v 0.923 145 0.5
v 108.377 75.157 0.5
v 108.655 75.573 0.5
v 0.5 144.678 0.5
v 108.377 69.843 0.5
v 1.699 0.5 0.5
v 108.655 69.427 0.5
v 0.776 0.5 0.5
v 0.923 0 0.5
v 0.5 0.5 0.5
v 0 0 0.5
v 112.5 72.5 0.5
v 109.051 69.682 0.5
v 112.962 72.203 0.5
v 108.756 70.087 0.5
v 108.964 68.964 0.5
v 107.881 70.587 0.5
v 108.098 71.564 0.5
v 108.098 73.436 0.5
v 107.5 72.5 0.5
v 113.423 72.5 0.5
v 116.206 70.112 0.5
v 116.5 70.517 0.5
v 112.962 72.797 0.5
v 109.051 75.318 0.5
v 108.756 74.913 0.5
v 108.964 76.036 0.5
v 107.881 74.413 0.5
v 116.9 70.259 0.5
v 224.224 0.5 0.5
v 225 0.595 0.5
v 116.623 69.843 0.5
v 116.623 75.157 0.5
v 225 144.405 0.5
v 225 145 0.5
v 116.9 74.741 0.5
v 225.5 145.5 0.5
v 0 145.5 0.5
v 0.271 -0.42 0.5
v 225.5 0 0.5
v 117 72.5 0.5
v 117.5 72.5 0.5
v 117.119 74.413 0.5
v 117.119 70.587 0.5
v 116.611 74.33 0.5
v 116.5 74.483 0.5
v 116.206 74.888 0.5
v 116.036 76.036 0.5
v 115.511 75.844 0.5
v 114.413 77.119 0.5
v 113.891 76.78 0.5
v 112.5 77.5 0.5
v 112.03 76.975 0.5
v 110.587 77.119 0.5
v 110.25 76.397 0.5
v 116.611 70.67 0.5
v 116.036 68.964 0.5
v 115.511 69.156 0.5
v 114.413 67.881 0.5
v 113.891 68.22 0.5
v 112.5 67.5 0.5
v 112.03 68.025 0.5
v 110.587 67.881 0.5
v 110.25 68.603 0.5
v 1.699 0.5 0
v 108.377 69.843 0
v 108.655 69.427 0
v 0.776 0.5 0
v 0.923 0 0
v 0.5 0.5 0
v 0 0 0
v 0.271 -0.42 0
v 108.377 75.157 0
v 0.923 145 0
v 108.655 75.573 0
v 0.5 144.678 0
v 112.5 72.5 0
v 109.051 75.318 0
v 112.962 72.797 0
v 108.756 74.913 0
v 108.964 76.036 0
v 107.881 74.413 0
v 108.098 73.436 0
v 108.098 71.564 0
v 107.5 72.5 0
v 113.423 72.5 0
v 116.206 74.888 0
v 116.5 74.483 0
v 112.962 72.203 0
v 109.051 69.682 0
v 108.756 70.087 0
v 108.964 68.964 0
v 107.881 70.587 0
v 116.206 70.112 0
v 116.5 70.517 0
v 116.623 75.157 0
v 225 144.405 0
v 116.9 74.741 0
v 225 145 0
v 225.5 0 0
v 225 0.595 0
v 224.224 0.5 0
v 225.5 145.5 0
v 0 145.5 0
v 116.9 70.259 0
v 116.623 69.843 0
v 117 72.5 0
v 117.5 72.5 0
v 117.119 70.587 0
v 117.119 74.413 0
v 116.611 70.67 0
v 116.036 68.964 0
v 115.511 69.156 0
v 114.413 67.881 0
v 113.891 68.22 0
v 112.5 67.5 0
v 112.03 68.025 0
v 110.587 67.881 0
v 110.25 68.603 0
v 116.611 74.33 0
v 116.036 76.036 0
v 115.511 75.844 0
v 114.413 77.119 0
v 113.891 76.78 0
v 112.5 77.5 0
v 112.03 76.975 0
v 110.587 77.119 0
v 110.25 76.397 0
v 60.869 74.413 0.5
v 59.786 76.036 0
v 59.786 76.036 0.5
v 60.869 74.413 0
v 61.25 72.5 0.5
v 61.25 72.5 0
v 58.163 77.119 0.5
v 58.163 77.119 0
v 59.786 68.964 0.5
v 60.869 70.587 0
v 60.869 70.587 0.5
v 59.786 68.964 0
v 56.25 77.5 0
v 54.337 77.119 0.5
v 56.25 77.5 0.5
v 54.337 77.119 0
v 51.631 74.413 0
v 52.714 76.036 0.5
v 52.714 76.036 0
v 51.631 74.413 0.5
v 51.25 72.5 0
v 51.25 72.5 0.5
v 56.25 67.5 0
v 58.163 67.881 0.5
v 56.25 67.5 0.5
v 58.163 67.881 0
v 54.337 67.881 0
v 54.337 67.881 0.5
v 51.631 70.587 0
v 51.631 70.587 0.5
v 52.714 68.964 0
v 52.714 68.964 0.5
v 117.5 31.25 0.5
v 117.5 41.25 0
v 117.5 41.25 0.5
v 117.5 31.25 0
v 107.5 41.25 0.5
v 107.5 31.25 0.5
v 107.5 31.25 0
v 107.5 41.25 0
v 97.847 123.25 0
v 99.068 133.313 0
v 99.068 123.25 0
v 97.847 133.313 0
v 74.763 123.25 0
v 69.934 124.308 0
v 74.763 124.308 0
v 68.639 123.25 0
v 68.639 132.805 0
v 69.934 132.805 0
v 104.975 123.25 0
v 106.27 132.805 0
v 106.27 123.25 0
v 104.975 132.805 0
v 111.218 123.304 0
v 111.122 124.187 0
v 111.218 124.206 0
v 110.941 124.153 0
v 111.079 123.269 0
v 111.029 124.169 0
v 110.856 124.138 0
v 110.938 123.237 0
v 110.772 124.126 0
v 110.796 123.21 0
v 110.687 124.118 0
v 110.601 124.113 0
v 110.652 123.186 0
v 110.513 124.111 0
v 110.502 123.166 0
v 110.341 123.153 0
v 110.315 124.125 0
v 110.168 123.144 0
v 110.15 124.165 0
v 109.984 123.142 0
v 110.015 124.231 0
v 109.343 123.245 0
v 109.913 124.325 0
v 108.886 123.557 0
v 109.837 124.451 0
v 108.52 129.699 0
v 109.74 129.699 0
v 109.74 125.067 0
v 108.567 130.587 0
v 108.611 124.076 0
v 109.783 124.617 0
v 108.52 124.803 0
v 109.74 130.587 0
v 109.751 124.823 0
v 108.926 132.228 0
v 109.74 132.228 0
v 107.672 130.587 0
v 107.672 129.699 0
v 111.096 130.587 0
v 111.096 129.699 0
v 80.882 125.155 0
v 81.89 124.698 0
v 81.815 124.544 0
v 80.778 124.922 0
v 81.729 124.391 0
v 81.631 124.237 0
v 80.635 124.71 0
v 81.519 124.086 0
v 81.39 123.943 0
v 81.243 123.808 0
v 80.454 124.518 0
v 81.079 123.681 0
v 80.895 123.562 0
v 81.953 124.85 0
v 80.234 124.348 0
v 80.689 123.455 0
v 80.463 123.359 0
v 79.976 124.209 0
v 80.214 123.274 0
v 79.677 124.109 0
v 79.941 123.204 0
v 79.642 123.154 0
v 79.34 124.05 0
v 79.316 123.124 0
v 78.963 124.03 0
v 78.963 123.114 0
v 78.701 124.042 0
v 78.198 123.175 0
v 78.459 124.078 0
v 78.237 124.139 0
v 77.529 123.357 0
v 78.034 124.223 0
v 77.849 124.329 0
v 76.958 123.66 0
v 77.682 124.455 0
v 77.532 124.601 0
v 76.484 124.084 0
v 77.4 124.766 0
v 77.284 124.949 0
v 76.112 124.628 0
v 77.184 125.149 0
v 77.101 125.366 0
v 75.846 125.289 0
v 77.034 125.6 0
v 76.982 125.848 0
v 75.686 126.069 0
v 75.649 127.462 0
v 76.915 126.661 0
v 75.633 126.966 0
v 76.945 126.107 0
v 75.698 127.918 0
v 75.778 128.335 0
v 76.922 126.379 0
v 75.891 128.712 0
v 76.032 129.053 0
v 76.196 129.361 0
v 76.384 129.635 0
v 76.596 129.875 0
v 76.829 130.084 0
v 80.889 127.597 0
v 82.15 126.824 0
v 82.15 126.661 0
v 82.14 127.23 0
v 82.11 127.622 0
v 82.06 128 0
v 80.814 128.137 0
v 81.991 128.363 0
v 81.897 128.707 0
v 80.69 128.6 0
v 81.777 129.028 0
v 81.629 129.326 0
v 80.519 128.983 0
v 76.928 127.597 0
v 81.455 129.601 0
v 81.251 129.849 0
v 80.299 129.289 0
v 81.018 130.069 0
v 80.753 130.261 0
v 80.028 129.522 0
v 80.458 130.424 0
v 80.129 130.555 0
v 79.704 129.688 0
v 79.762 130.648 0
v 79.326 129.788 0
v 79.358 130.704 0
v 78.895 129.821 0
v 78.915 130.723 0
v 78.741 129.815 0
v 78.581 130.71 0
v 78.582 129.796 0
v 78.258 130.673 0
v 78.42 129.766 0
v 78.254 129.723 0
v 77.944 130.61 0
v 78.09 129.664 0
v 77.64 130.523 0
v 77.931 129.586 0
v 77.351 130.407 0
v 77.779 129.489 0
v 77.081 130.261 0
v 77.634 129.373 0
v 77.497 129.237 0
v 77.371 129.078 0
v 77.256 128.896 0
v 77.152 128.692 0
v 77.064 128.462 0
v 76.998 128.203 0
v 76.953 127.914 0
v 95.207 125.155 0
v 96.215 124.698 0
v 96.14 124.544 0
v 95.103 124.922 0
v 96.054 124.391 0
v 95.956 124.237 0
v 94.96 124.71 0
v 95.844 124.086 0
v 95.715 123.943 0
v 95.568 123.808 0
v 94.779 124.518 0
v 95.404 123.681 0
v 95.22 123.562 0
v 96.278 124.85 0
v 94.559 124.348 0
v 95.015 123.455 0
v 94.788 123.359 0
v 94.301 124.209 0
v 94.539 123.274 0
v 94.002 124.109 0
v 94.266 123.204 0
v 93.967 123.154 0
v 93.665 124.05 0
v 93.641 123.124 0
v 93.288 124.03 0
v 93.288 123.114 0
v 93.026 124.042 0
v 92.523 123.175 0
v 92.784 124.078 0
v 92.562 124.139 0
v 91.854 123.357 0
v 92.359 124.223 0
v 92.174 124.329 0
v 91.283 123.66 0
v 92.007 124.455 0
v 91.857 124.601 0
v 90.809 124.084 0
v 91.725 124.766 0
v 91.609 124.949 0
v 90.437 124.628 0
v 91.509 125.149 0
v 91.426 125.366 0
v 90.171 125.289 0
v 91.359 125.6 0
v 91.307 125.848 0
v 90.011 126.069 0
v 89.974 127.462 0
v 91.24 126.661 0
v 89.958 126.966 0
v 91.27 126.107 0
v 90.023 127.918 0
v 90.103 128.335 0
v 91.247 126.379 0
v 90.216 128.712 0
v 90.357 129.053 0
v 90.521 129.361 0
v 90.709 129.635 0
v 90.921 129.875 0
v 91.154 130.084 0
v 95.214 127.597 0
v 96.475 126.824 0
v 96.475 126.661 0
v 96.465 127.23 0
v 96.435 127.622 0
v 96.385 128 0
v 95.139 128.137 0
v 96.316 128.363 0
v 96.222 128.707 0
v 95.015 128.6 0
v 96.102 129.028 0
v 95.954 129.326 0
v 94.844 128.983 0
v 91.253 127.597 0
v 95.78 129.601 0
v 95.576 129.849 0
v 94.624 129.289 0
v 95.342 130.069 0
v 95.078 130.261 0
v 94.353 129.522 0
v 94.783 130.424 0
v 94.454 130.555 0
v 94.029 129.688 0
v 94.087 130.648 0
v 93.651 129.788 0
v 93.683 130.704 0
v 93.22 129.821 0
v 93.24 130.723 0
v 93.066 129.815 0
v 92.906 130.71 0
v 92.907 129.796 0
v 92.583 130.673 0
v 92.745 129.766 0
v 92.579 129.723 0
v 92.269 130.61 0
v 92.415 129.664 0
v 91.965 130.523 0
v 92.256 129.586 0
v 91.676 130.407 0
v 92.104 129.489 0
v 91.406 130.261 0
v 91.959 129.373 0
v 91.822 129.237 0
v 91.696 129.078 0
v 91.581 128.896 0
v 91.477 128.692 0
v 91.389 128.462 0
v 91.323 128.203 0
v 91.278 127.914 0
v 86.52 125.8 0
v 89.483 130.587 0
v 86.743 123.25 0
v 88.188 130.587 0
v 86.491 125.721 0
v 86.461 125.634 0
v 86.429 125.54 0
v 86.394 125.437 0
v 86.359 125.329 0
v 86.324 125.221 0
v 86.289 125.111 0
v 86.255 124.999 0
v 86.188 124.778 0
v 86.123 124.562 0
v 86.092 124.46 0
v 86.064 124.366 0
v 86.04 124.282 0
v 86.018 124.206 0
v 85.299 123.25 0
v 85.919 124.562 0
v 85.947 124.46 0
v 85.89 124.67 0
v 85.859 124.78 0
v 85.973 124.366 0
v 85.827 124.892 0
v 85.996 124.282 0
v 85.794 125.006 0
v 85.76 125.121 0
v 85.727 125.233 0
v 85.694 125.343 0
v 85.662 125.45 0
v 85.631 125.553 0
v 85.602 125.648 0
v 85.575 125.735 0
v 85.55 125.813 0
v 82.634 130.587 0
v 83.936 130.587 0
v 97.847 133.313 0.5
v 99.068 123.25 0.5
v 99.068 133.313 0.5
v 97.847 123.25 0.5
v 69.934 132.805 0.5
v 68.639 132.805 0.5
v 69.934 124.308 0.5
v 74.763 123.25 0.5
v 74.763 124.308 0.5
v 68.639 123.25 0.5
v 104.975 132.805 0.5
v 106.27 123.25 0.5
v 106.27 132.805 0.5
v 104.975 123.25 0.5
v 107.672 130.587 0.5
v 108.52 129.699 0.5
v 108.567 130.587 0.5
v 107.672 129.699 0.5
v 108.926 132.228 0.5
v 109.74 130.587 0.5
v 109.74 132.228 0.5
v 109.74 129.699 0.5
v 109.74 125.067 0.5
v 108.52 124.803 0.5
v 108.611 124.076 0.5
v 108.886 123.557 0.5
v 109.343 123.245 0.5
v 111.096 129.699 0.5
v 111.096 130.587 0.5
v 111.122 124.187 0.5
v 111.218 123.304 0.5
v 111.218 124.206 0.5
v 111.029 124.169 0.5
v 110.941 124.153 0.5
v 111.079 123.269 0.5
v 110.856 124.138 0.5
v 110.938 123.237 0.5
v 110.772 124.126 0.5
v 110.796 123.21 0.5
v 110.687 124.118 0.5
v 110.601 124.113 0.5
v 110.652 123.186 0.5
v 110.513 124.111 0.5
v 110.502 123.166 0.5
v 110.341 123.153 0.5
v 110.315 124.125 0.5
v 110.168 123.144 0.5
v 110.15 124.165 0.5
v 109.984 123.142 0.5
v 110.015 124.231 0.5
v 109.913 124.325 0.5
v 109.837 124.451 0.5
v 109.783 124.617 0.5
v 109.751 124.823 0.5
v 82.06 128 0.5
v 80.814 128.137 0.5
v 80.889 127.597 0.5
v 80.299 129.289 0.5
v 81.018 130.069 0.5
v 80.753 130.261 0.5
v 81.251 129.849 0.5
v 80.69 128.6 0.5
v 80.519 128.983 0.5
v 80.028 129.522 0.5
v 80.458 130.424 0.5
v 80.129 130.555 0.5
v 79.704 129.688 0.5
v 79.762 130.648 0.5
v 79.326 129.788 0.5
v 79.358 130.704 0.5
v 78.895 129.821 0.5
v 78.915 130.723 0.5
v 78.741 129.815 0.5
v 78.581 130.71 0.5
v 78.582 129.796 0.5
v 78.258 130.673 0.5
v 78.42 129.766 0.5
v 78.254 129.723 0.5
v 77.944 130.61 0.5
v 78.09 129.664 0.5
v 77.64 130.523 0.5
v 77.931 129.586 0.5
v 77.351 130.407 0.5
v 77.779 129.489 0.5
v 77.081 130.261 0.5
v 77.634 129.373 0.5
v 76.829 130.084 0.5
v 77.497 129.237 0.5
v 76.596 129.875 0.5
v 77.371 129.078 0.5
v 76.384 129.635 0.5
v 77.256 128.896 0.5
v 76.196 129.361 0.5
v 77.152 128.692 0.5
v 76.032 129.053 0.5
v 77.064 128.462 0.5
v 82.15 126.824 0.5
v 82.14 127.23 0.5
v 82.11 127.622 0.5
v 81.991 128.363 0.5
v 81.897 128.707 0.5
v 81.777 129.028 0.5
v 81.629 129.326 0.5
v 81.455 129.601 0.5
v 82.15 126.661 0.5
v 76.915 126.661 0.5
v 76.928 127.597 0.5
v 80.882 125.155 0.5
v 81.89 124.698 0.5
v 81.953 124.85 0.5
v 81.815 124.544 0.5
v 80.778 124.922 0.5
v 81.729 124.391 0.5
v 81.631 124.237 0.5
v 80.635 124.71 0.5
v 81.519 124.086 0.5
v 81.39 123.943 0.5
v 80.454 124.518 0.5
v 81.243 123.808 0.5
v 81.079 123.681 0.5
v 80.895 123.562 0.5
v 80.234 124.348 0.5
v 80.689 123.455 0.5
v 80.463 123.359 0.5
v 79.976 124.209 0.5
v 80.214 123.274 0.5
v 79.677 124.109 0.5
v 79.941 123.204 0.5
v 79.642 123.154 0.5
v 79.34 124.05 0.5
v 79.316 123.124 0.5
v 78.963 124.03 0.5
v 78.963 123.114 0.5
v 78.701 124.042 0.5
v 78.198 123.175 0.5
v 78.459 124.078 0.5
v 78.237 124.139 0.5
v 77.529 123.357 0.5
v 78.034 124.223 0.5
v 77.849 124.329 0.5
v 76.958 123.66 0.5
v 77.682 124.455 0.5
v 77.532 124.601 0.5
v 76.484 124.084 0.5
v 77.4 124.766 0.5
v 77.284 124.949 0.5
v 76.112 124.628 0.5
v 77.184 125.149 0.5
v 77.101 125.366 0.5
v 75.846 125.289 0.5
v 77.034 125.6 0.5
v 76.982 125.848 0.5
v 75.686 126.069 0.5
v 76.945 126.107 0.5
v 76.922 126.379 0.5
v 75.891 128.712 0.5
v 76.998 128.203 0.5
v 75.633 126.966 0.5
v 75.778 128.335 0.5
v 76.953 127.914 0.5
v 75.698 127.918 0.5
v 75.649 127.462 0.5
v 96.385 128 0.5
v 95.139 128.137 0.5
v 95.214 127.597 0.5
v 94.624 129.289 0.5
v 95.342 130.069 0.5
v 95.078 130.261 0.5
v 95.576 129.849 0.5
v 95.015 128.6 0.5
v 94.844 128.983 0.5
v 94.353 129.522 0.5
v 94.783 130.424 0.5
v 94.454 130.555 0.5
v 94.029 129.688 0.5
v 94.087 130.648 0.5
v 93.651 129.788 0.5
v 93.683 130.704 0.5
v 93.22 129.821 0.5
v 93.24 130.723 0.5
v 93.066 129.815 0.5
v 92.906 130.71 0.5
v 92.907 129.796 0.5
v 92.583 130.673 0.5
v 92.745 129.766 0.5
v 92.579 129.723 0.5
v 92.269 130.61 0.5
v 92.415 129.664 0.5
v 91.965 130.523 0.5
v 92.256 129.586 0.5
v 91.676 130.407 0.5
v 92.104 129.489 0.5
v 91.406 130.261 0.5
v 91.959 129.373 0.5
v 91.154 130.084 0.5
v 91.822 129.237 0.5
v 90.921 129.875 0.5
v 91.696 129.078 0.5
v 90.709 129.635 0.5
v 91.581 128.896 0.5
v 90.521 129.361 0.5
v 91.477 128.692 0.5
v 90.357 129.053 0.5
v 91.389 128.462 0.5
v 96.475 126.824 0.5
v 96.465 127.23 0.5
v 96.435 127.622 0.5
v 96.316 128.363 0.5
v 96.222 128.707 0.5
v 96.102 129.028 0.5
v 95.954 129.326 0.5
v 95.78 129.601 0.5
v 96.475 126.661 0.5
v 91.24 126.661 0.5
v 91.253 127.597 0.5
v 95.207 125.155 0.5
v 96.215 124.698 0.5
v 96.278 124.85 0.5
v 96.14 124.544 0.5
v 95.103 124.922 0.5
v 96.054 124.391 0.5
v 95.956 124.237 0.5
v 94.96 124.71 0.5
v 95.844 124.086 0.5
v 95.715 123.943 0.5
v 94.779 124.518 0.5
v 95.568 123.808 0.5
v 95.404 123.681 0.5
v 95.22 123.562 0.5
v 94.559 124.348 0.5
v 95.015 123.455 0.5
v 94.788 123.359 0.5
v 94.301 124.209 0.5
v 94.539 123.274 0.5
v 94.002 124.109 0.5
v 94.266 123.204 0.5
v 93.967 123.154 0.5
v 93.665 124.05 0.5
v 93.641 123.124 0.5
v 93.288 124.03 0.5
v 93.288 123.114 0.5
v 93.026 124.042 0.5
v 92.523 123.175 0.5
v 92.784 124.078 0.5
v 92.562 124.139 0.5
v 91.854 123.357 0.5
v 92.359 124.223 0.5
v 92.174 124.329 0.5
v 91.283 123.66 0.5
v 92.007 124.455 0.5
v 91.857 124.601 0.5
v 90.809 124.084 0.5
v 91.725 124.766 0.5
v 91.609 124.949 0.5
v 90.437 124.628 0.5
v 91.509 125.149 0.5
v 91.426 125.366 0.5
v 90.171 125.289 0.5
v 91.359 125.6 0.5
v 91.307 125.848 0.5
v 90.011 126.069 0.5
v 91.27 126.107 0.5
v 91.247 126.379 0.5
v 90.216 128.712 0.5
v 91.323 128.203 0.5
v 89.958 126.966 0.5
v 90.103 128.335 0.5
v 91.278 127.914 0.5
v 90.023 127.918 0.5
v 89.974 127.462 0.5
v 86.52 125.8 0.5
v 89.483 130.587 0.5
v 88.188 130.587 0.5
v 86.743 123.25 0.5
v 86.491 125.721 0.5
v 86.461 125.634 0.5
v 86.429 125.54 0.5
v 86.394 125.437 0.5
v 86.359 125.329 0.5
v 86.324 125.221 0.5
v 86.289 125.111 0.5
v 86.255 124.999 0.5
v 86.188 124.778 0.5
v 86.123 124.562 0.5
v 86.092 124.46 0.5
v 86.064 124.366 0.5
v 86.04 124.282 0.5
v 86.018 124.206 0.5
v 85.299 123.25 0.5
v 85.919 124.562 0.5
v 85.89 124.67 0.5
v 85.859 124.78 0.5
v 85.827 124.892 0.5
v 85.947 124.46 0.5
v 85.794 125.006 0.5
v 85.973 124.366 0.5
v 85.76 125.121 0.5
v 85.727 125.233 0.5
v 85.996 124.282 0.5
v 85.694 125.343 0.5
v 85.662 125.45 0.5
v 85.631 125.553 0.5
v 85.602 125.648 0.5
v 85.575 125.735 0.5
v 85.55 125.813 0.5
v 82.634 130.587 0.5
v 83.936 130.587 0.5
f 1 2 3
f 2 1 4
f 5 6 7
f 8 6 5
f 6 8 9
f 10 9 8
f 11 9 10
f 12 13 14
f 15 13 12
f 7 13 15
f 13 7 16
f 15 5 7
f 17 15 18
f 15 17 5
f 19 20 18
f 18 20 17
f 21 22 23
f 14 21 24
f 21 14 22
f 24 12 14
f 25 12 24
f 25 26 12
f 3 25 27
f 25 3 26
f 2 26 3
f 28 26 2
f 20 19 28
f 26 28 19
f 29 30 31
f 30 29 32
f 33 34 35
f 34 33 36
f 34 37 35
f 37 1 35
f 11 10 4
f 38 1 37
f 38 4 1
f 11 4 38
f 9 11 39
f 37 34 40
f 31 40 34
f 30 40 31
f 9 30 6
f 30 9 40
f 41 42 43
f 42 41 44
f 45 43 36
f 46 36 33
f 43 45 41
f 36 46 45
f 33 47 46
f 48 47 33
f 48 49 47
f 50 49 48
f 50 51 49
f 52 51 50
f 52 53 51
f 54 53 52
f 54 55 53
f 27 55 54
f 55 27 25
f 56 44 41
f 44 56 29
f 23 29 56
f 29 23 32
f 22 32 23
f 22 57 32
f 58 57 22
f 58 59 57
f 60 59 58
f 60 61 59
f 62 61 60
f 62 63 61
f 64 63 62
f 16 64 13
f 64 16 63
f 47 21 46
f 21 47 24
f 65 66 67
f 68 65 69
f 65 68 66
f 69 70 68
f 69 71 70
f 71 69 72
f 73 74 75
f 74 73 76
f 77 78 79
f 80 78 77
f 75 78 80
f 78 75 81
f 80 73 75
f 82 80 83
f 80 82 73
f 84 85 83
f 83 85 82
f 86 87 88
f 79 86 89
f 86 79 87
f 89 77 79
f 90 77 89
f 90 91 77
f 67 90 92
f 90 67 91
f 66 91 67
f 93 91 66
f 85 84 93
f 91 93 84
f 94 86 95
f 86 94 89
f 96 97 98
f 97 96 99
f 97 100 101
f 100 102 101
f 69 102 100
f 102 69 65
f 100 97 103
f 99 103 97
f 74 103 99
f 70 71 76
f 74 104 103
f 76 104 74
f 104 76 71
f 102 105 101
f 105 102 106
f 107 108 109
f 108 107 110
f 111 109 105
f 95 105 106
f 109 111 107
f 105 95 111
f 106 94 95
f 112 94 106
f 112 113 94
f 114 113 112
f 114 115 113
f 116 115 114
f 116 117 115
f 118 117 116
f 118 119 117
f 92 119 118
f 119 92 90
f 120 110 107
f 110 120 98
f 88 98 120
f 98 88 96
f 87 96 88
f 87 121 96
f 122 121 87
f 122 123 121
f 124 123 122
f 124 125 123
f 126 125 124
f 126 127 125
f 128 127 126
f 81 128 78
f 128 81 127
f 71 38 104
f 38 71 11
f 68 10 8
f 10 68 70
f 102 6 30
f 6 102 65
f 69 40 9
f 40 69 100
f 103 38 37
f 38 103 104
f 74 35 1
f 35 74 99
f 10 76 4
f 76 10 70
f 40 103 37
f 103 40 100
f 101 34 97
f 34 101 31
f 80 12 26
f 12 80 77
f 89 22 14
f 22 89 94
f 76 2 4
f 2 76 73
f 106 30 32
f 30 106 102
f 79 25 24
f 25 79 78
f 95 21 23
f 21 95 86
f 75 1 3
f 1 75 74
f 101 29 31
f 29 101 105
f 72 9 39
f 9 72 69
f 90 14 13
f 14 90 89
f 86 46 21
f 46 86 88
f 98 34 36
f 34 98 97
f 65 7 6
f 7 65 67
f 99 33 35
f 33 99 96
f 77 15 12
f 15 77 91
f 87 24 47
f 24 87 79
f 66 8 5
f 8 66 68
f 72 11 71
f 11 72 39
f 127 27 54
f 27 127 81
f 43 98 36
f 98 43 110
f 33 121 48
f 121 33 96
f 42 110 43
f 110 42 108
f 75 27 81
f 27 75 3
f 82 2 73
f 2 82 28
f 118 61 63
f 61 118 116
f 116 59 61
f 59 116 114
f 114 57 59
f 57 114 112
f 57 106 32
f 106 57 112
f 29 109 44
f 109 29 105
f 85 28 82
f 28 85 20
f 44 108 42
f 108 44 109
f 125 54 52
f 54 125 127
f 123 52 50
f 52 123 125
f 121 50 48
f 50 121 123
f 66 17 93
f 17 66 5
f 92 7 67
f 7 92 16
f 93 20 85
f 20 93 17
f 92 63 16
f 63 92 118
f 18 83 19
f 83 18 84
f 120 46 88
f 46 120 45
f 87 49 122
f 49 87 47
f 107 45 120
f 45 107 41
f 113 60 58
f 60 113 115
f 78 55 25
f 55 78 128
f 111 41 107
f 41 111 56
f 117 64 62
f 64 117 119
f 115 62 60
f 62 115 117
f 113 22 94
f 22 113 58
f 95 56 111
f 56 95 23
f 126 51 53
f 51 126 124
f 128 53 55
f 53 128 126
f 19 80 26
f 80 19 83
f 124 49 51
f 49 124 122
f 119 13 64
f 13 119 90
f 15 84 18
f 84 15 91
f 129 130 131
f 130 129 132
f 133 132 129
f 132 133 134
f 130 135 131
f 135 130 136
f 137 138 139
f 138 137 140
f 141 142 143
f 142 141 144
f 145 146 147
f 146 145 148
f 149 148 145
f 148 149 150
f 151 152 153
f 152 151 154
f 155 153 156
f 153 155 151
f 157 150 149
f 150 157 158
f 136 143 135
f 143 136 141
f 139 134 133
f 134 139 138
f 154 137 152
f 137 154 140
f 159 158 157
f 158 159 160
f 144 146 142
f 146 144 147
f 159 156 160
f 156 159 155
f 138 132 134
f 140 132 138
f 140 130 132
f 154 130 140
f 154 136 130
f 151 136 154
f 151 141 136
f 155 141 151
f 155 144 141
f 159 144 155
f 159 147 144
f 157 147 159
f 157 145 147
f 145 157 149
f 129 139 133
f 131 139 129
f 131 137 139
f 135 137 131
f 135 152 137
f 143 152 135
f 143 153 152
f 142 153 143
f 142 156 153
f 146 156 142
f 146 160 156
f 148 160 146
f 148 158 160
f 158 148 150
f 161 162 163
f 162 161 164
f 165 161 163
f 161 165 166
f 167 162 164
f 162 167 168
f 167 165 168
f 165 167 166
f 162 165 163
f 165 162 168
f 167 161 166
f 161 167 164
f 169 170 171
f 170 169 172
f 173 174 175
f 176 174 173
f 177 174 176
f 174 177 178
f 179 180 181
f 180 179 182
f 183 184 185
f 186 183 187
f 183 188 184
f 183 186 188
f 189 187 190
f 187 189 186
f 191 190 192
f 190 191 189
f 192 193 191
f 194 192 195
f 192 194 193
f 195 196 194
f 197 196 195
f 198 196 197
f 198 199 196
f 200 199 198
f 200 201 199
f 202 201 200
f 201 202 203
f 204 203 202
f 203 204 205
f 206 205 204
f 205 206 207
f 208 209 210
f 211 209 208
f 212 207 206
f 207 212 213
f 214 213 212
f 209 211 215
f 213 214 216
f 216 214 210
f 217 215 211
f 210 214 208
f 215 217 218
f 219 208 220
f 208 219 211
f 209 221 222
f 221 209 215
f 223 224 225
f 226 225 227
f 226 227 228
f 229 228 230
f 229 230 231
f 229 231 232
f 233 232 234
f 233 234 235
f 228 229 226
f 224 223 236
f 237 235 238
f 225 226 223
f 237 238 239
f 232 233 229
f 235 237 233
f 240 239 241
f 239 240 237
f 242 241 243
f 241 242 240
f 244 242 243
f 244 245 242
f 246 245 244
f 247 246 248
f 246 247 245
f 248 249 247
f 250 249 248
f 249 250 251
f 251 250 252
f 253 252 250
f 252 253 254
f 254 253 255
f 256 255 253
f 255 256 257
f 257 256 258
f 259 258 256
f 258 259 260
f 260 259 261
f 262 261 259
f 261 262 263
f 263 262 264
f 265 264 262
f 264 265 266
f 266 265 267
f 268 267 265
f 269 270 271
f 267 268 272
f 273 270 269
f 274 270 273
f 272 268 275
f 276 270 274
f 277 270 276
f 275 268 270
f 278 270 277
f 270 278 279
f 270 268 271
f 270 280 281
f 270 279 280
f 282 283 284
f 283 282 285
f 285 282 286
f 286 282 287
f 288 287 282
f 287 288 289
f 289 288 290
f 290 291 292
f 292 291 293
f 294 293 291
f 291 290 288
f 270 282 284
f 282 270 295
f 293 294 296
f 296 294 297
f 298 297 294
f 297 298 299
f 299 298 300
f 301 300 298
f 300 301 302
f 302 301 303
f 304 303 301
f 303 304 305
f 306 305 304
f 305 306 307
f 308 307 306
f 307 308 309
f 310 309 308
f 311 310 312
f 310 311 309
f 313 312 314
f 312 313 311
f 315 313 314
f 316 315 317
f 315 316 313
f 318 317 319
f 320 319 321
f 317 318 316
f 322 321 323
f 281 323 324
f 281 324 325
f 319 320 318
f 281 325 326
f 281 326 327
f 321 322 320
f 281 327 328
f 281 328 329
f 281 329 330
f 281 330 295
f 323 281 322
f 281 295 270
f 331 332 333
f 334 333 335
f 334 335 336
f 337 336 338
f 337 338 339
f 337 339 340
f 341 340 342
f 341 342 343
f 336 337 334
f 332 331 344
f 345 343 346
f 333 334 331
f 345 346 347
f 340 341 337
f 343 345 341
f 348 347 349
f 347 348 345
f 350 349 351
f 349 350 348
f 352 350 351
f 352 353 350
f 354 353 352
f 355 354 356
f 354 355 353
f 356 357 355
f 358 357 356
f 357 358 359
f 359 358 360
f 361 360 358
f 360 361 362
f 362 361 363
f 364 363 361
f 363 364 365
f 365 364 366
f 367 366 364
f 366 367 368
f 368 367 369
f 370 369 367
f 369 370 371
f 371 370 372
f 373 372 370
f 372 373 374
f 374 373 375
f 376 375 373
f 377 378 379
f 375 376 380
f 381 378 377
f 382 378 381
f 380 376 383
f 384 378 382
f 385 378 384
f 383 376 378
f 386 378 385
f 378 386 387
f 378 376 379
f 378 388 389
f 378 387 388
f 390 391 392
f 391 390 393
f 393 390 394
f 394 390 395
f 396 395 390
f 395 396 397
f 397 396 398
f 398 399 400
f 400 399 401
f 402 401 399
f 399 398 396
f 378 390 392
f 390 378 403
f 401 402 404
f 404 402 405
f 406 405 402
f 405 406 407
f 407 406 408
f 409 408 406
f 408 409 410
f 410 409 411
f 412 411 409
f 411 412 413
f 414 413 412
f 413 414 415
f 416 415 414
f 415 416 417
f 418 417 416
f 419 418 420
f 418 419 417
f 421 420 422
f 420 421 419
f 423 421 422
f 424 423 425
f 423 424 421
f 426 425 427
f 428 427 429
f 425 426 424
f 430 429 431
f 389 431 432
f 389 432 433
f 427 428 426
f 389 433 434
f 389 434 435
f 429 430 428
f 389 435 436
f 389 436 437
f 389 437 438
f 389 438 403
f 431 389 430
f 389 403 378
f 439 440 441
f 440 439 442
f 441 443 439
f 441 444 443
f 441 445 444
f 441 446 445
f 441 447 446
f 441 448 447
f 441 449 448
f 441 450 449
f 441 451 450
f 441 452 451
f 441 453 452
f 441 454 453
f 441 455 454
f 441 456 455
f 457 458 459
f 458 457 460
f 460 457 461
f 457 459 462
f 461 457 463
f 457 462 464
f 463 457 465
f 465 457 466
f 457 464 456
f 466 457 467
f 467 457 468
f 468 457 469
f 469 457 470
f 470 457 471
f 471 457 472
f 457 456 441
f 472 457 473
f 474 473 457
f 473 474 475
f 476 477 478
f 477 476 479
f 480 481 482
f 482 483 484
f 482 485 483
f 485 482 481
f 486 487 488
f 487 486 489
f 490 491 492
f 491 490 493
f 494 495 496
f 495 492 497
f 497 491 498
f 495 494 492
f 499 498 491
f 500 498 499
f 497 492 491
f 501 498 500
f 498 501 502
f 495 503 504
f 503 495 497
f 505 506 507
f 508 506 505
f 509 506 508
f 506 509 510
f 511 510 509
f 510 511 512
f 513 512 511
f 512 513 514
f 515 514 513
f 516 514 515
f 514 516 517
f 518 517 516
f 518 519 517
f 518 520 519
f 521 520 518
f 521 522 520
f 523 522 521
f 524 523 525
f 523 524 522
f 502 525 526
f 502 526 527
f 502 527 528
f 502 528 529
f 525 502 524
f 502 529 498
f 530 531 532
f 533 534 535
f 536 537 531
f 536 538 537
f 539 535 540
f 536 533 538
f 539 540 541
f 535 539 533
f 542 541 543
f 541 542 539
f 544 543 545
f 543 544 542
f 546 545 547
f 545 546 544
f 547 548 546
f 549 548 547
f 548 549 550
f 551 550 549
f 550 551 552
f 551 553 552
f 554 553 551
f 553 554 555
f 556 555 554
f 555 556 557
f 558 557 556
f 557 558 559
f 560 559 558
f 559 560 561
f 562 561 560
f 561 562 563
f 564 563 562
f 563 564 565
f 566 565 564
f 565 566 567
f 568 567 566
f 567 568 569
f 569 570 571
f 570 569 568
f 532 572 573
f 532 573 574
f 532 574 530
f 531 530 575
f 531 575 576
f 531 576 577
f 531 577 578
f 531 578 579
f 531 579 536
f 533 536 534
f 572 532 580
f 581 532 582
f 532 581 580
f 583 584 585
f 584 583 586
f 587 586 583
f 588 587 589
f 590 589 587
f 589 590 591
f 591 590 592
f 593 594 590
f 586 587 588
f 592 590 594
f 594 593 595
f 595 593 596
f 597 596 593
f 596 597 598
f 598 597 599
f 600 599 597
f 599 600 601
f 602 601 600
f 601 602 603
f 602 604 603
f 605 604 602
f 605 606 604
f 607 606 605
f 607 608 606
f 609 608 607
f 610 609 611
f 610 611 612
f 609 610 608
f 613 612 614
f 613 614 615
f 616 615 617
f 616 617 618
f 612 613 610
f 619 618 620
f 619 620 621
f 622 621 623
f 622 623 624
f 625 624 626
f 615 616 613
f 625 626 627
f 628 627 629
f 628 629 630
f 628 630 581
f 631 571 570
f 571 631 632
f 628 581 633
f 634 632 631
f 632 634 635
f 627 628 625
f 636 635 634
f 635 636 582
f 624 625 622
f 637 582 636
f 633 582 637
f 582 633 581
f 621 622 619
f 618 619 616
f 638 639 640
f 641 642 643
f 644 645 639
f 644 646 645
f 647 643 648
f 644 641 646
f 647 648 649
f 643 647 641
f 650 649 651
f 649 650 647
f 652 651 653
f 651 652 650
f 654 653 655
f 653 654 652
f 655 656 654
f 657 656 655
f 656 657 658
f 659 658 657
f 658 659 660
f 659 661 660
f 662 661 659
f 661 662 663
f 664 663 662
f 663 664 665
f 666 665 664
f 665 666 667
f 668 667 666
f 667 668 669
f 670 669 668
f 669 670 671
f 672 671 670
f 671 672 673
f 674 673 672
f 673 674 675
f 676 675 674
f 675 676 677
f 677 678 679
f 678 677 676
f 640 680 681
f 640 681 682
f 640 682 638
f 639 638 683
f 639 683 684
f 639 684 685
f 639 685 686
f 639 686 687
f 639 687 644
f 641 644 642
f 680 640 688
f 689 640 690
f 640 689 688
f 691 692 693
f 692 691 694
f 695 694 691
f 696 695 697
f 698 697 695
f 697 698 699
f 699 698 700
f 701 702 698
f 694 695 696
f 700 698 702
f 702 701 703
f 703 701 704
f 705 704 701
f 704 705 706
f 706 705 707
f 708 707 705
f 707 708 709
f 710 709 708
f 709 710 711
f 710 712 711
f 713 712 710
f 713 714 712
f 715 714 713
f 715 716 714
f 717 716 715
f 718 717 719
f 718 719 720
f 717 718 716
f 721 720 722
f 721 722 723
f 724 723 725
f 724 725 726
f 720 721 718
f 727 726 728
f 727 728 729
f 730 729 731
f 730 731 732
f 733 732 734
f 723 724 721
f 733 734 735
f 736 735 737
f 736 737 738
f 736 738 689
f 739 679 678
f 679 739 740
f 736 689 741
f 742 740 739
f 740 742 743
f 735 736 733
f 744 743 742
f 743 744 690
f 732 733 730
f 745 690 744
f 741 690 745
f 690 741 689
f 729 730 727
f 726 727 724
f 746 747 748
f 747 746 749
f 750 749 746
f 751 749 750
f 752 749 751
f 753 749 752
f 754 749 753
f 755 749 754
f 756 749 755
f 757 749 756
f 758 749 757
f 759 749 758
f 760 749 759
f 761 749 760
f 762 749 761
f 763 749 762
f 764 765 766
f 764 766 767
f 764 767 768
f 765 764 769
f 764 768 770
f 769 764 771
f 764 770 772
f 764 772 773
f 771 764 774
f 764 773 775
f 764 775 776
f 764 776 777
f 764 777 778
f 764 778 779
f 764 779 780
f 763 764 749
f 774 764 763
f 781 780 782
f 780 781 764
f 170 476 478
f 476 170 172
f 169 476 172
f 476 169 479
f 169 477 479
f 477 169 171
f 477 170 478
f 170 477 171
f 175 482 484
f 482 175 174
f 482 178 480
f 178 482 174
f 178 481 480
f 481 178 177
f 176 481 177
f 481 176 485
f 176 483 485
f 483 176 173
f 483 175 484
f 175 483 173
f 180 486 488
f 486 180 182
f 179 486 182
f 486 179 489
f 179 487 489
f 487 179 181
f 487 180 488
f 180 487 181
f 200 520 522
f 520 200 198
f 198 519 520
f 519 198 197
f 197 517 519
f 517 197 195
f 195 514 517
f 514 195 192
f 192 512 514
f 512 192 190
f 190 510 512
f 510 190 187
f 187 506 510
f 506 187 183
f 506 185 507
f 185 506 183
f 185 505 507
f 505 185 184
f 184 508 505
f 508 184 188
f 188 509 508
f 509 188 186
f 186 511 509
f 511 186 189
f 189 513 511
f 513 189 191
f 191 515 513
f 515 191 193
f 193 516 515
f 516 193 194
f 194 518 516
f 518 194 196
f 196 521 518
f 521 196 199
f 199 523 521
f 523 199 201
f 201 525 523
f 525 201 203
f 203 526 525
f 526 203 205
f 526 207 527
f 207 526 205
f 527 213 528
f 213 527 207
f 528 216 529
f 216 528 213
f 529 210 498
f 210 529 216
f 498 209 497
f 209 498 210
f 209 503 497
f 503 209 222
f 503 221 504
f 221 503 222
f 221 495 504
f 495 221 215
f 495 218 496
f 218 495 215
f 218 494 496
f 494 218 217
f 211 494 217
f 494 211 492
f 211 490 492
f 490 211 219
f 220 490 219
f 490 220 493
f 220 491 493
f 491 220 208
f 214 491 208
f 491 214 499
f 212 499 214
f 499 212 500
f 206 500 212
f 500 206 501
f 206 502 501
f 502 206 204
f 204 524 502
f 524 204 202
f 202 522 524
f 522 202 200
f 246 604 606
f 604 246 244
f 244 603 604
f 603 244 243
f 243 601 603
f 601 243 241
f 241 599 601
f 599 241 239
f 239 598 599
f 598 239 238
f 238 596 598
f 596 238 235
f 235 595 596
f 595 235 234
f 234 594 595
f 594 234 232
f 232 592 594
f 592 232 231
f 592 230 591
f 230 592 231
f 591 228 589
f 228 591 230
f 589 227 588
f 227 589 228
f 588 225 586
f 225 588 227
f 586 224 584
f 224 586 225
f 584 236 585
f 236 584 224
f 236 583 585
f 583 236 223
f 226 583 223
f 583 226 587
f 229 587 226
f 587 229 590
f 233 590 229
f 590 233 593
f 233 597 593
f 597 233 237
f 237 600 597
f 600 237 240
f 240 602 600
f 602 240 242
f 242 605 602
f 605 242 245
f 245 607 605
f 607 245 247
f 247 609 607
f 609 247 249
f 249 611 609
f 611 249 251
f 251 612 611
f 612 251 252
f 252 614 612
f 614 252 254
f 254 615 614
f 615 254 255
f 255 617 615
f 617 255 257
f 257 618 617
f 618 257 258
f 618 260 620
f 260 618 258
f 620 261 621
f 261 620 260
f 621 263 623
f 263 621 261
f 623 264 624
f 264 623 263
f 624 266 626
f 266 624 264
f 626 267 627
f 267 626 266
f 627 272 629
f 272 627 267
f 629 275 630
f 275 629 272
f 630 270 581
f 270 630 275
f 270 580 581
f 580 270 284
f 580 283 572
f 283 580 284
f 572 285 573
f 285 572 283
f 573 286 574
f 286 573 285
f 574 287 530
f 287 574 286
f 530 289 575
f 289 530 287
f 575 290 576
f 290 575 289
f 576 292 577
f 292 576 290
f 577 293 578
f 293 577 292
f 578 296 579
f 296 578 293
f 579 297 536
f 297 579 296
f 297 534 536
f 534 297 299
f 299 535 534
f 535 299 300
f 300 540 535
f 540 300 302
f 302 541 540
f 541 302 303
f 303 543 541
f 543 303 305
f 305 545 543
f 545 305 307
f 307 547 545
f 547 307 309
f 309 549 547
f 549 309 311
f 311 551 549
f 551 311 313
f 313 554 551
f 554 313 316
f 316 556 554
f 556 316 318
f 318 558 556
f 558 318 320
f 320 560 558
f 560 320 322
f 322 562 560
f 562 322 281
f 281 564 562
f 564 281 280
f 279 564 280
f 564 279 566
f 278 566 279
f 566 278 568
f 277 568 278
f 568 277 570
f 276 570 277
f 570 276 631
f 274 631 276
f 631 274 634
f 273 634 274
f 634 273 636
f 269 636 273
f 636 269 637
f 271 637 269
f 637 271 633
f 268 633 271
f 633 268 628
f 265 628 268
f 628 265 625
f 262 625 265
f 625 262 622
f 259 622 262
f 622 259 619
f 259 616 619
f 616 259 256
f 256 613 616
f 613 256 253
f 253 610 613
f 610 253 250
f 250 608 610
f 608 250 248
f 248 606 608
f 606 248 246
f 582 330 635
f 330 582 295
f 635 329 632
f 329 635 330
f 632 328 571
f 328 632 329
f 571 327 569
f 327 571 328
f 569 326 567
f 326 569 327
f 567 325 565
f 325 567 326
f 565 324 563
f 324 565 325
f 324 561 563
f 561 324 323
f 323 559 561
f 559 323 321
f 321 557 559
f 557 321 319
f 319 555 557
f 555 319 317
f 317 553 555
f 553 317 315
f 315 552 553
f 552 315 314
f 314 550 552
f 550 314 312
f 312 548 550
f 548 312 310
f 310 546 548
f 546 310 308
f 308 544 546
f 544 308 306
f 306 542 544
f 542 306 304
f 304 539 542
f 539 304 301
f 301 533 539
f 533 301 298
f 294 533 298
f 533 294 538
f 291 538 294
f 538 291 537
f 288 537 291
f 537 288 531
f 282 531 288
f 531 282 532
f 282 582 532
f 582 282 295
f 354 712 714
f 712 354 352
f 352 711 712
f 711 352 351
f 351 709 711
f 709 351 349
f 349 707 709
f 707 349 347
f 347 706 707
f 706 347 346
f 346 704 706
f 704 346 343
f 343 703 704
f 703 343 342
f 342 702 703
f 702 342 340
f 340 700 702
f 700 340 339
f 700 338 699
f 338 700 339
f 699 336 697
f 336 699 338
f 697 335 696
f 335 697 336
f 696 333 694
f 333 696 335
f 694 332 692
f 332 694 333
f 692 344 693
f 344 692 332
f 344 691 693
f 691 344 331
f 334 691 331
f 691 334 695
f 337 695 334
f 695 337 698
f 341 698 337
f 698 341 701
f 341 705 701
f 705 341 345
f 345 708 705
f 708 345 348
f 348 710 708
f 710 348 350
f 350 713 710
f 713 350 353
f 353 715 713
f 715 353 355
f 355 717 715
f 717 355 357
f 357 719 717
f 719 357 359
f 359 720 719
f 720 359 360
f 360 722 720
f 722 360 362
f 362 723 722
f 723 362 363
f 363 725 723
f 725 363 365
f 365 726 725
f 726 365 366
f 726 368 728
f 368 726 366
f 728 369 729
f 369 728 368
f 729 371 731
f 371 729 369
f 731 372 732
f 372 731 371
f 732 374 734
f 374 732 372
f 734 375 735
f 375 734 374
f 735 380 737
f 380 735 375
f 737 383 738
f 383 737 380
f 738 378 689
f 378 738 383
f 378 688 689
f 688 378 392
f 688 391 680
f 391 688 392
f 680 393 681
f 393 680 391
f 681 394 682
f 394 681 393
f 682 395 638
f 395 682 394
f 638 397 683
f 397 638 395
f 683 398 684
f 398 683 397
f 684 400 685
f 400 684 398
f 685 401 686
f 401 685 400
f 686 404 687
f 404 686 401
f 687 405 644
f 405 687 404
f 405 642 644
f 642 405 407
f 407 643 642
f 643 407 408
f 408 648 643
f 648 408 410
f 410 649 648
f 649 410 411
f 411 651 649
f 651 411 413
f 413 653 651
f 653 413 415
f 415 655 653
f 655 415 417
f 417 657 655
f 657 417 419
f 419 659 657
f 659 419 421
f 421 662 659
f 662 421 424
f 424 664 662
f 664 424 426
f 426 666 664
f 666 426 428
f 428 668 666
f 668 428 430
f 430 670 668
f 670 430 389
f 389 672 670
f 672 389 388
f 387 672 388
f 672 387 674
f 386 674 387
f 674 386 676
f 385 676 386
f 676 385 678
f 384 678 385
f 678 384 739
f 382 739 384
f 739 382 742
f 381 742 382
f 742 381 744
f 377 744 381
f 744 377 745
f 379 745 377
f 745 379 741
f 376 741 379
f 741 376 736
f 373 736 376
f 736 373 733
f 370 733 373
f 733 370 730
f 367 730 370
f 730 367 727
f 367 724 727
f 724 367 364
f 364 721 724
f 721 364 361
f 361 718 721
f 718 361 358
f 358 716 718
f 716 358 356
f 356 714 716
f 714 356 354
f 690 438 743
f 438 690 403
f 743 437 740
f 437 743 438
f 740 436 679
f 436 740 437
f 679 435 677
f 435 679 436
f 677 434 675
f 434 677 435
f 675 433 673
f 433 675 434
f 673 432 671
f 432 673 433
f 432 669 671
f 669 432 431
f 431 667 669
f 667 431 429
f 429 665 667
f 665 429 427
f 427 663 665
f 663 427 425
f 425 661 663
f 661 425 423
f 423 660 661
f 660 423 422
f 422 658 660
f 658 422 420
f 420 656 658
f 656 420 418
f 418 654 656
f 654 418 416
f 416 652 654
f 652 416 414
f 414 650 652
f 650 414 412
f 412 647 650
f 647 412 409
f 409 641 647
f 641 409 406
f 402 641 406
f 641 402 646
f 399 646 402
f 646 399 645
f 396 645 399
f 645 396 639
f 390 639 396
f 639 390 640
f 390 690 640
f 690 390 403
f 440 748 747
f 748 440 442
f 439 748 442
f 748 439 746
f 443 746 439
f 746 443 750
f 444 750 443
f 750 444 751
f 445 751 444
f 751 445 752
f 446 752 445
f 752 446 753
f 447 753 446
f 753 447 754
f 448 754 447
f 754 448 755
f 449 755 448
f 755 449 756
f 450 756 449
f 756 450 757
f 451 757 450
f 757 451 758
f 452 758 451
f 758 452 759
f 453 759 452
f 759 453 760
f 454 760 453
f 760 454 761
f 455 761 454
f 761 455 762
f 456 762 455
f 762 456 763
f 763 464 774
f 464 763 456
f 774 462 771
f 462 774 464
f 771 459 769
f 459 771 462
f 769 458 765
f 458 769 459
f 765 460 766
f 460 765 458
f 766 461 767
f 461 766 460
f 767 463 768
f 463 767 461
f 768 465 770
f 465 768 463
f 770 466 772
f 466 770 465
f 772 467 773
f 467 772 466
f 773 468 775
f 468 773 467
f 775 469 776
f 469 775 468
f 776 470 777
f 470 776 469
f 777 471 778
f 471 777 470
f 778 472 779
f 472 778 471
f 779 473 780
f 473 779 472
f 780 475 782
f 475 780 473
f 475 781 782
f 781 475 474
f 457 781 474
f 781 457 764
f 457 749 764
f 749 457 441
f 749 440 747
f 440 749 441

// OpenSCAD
//
//  Leveling Test Generator
//
//  EvilTeach 11/2015
//

// PrintBed Dimensions
xMax = 225;         // FlashForge Creator Dual
yMax = 145;

// Print Height
height = 0.5;



// Crosshairs are useful to see how close you are to the center of the plate
module zero_crosshairs()
{
    translate([xMax / 2.0, yMax / 2.0, 0]) 
        difference()
        {
            cylinder(r = 5.0, h = height);
            cylinder(r = 4.5, h = height);
        }
}



// Print lines to show any obvious leveling issues.
module plate_leveling_lines()
{
    // all around the outside
    translate([0, 0, 0])
        cube([xMax, height, height]);

    translate([0, yMax, 0])
       cube([xMax, height, height]);

    translate([0, 0, 0])
        cube([height, yMax, height]);

    translate([xMax, 0, 0])
        cube([height, yMax, height]);

    // This seems to cover up a defect in openscad.
    // I haven't investigated it seriously, so i is probably my bug
    translate([xMax, yMax, 0])
        cube([height, height, height]);


    // Calculate the angle to draw the diagonals
    a = xMax;
    b = yMax;
    c = sqrt(a * a + b * b);
    
    sinB = b / c;
    angleB = asin(sinB);
    
    translate([xMax, 0, 0])
        rotate(90 - angleB, 0, 0)
            cube([height, c , height]);

    translate([0, 0, 0])
        rotate(angleB - 90, 0, 0)
            cube([height, c, height]);
        
}



// Draw two small shapes with fill
module fill_some_shapes()
{
    translate([xMax / 4, yMax / 2, 0])
        cylinder(r = 5, h = height);
    
    cubeSize = 10;
    translate([xMax / 2 - cubeSize / 2, yMax / 4 - cubeSize / 2, 0])
        cube([cubeSize, cubeSize, height]);
}



// Toss a few letters into the mix 
module some_text()
{
    translate([xMax * 0.30, yMax * 0.85, 0])  
        linear_extrude(height = height)
        text("Level It");
}



module main()
{
    color("yellow") plate_leveling_lines();
    color("cyan")   zero_crosshairs();
    color("lime")   fill_some_shapes();
    color("red")    some_text();
}

main();
